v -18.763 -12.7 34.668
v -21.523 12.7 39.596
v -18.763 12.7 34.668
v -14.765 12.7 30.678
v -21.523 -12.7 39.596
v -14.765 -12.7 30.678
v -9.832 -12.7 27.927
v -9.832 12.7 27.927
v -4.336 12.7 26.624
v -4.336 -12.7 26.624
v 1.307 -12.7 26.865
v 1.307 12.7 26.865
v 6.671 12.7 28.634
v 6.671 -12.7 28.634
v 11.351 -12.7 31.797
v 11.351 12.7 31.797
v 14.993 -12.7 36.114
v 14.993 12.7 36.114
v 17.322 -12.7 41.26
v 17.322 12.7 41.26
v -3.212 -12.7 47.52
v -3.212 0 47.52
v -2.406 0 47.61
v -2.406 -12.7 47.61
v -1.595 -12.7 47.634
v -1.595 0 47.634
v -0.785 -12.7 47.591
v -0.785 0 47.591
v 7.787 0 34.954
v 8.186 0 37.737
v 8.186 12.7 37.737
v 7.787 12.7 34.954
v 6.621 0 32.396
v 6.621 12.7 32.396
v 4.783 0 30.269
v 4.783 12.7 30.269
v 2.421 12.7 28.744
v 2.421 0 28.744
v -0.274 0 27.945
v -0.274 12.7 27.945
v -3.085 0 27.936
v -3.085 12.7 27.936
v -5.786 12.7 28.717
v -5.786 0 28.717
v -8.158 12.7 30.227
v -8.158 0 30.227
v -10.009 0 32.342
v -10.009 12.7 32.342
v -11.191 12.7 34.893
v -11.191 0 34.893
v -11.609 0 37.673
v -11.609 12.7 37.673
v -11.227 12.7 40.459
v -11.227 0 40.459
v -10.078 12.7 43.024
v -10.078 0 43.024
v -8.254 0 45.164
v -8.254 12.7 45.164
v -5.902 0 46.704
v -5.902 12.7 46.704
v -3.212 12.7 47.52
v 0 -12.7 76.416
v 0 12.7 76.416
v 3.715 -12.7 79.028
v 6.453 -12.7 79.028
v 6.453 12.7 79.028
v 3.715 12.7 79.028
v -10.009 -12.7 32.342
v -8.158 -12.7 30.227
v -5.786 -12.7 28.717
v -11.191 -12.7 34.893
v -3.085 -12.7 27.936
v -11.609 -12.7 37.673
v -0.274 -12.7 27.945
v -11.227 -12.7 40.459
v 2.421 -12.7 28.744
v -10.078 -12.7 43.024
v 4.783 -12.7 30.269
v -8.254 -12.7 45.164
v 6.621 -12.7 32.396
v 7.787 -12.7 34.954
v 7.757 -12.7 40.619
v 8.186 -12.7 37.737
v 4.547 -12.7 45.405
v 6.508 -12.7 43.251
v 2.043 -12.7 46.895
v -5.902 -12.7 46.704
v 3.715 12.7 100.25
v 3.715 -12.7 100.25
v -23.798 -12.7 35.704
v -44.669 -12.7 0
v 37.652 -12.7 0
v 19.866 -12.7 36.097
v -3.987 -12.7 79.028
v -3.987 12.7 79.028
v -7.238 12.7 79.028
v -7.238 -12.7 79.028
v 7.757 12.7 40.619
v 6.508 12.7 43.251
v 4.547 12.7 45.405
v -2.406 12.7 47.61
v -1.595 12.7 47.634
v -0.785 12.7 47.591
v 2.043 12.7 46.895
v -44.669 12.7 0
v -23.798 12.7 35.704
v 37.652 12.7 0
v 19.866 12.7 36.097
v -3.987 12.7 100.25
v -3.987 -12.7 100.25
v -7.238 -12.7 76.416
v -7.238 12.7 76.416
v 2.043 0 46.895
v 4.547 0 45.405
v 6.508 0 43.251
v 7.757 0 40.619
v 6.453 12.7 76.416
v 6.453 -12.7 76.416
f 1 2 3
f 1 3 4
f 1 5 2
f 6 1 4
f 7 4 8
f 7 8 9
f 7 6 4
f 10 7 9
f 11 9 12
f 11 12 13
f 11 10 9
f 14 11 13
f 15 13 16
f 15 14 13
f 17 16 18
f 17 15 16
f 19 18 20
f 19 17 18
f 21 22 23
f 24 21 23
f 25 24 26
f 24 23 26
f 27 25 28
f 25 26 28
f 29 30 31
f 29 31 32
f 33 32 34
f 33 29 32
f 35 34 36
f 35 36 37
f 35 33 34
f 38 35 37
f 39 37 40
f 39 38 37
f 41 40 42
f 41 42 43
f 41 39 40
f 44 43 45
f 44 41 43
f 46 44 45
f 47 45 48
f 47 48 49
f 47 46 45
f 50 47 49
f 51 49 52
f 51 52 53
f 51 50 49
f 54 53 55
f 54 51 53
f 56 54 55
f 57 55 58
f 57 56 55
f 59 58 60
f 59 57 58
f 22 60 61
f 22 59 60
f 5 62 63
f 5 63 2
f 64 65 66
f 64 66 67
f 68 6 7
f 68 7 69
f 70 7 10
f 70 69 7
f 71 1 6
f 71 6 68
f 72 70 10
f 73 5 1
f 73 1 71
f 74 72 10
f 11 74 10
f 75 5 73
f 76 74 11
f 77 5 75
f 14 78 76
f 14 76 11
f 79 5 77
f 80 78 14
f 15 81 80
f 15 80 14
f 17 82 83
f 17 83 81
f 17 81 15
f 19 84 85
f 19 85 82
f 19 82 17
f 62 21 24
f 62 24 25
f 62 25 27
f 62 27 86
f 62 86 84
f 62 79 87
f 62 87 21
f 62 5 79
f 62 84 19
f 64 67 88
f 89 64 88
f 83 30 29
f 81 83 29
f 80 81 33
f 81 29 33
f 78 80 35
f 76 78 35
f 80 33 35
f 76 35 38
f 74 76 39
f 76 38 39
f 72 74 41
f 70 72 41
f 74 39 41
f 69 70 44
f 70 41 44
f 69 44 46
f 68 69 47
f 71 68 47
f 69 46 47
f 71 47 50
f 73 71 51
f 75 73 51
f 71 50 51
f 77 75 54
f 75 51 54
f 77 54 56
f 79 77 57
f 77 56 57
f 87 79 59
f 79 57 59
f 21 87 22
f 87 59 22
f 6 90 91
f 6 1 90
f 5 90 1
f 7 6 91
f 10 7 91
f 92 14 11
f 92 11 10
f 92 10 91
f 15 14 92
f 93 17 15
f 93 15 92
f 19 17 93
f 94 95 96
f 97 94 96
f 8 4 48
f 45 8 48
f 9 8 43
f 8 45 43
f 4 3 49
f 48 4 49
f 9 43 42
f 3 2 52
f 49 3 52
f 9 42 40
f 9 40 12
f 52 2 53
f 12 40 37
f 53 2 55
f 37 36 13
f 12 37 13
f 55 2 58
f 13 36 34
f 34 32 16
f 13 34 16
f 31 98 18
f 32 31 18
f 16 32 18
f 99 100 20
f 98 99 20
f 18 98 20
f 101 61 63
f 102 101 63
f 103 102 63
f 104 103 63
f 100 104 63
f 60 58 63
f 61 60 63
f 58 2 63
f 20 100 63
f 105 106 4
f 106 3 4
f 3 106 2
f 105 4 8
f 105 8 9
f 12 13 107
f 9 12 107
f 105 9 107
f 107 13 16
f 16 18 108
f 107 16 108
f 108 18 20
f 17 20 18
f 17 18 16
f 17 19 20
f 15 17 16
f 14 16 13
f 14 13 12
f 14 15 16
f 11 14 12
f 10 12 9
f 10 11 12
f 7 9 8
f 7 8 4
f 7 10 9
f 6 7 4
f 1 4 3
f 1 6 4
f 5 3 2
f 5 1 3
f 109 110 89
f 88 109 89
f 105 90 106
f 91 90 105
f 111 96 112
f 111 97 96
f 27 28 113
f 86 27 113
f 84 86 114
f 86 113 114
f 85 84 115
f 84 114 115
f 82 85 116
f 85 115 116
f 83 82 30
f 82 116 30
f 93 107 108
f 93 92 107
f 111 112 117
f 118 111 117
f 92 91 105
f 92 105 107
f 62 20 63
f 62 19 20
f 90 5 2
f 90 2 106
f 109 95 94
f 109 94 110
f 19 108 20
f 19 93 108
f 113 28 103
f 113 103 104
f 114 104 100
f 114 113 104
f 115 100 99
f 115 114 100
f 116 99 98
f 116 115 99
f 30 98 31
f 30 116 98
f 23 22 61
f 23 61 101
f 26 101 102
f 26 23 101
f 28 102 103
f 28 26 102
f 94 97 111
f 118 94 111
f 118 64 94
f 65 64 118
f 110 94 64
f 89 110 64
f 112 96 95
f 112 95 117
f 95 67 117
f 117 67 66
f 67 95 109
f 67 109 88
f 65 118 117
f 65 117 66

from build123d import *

# Parameters (mm, degrees)
F0_W     = 7.7014972921
F0_H     = 21.2219059467
F1_DEPTH = 12.7
F2_DEPTH = 12.7


with BuildPart() as f1:
    # F0 (on Front) → F1 (new body, symmetric)
    with BuildSketch(Plane.XZ):
        Polygon((-7.238256745, 76.4159709215), (0, 76.4159709215), (6.4532933757, 76.4159709215), (6.4532933757, 79.0277123451), (3.7149835844, 79.0277123451), (-3.9865137078, 79.0277123451), (-7.238256745, 79.0277123451), align=None)
        with Locations((-0.1357650617, 89.6386653185)):
            Rectangle(F0_W, F0_H)
    extrude(amount=F1_DEPTH, both=True)


with BuildPart() as f1b:
    # F0 (on Front) → F1, piece 2 (new body, symmetric)
    with BuildSketch(Plane.XZ):
        with BuildLine():
            Line((17.3220709686, 41.2600404343), (0, 76.4159709215))
            Line((0, 76.4159709215), (-21.5230545638, 39.5958789949))
            ThreePointArc((-21.5230545638, 39.5958789949), (-13.0451934188, 45.1237764238), (-3.2121875635, 47.520393921))
            ThreePointArc((-3.2121875635, 47.520393921), (-2.0009642715, 47.6305979408), (-0.78536921, 47.5914133078))
            ThreePointArc((-0.78536921, 47.5914133078), (8.7876406396, 45.9108721087), (17.3220709686, 41.2600404343))
        make_face()
        with BuildLine():
            ThreePointArc((-3.2121875635, 47.520393921), (-13.0451934188, 45.1237764238), (-21.5230545638, 39.5958789949))
            ThreePointArc((-21.5230545638, 39.5958789949), (-1.5059378491, 26.5497852672), (17.3220709686, 41.2600404343))
            ThreePointArc((17.3220709686, 41.2600404343), (8.7876406396, 45.9108721087), (-0.78536921, 47.5914133078))
            ThreePointArc((-0.78536921, 47.5914133078), (5.6072402658, 44.400467109), (8.1860534635, 37.7373360097))
            ThreePointArc((8.1860534635, 37.7373360097), (-8.1576383823, 30.226874629), (-3.2121875635, 47.520393921))
        make_face()
    extrude(amount=F1_DEPTH, both=True)


with BuildPart() as f2:
    # F0 (on Front) → F2 (new body, symmetric)
    with BuildSketch(Plane.XZ):
        with BuildLine():
            ThreePointArc((17.3220709686, 41.2600404343), (-1.5059378491, 26.5497852672), (-21.5230545638, 39.5958789949))
            Line((-21.5230545638, 39.5958789949), (-23.7980011796, 35.7040641377))
            Line((-23.7980011796, 35.7040641377), (-44.6686856449, 0))
            Line((-44.6686856449, 0), (-30.3427483886, 0))
            Line((-30.3427483886, 0), (10.7319038361, 0))
            Line((10.7319038361, 0), (37.6517660916, 0))
            Line((37.6517660916, 0), (19.8661076984, 36.09680224))
            Line((19.8661076984, 36.09680224), (17.3220709686, 41.2600404343))
        make_face()
    extrude(amount=F2_DEPTH, both=True)


solid = Compound([f1.part, f1b.part, f2.part])
